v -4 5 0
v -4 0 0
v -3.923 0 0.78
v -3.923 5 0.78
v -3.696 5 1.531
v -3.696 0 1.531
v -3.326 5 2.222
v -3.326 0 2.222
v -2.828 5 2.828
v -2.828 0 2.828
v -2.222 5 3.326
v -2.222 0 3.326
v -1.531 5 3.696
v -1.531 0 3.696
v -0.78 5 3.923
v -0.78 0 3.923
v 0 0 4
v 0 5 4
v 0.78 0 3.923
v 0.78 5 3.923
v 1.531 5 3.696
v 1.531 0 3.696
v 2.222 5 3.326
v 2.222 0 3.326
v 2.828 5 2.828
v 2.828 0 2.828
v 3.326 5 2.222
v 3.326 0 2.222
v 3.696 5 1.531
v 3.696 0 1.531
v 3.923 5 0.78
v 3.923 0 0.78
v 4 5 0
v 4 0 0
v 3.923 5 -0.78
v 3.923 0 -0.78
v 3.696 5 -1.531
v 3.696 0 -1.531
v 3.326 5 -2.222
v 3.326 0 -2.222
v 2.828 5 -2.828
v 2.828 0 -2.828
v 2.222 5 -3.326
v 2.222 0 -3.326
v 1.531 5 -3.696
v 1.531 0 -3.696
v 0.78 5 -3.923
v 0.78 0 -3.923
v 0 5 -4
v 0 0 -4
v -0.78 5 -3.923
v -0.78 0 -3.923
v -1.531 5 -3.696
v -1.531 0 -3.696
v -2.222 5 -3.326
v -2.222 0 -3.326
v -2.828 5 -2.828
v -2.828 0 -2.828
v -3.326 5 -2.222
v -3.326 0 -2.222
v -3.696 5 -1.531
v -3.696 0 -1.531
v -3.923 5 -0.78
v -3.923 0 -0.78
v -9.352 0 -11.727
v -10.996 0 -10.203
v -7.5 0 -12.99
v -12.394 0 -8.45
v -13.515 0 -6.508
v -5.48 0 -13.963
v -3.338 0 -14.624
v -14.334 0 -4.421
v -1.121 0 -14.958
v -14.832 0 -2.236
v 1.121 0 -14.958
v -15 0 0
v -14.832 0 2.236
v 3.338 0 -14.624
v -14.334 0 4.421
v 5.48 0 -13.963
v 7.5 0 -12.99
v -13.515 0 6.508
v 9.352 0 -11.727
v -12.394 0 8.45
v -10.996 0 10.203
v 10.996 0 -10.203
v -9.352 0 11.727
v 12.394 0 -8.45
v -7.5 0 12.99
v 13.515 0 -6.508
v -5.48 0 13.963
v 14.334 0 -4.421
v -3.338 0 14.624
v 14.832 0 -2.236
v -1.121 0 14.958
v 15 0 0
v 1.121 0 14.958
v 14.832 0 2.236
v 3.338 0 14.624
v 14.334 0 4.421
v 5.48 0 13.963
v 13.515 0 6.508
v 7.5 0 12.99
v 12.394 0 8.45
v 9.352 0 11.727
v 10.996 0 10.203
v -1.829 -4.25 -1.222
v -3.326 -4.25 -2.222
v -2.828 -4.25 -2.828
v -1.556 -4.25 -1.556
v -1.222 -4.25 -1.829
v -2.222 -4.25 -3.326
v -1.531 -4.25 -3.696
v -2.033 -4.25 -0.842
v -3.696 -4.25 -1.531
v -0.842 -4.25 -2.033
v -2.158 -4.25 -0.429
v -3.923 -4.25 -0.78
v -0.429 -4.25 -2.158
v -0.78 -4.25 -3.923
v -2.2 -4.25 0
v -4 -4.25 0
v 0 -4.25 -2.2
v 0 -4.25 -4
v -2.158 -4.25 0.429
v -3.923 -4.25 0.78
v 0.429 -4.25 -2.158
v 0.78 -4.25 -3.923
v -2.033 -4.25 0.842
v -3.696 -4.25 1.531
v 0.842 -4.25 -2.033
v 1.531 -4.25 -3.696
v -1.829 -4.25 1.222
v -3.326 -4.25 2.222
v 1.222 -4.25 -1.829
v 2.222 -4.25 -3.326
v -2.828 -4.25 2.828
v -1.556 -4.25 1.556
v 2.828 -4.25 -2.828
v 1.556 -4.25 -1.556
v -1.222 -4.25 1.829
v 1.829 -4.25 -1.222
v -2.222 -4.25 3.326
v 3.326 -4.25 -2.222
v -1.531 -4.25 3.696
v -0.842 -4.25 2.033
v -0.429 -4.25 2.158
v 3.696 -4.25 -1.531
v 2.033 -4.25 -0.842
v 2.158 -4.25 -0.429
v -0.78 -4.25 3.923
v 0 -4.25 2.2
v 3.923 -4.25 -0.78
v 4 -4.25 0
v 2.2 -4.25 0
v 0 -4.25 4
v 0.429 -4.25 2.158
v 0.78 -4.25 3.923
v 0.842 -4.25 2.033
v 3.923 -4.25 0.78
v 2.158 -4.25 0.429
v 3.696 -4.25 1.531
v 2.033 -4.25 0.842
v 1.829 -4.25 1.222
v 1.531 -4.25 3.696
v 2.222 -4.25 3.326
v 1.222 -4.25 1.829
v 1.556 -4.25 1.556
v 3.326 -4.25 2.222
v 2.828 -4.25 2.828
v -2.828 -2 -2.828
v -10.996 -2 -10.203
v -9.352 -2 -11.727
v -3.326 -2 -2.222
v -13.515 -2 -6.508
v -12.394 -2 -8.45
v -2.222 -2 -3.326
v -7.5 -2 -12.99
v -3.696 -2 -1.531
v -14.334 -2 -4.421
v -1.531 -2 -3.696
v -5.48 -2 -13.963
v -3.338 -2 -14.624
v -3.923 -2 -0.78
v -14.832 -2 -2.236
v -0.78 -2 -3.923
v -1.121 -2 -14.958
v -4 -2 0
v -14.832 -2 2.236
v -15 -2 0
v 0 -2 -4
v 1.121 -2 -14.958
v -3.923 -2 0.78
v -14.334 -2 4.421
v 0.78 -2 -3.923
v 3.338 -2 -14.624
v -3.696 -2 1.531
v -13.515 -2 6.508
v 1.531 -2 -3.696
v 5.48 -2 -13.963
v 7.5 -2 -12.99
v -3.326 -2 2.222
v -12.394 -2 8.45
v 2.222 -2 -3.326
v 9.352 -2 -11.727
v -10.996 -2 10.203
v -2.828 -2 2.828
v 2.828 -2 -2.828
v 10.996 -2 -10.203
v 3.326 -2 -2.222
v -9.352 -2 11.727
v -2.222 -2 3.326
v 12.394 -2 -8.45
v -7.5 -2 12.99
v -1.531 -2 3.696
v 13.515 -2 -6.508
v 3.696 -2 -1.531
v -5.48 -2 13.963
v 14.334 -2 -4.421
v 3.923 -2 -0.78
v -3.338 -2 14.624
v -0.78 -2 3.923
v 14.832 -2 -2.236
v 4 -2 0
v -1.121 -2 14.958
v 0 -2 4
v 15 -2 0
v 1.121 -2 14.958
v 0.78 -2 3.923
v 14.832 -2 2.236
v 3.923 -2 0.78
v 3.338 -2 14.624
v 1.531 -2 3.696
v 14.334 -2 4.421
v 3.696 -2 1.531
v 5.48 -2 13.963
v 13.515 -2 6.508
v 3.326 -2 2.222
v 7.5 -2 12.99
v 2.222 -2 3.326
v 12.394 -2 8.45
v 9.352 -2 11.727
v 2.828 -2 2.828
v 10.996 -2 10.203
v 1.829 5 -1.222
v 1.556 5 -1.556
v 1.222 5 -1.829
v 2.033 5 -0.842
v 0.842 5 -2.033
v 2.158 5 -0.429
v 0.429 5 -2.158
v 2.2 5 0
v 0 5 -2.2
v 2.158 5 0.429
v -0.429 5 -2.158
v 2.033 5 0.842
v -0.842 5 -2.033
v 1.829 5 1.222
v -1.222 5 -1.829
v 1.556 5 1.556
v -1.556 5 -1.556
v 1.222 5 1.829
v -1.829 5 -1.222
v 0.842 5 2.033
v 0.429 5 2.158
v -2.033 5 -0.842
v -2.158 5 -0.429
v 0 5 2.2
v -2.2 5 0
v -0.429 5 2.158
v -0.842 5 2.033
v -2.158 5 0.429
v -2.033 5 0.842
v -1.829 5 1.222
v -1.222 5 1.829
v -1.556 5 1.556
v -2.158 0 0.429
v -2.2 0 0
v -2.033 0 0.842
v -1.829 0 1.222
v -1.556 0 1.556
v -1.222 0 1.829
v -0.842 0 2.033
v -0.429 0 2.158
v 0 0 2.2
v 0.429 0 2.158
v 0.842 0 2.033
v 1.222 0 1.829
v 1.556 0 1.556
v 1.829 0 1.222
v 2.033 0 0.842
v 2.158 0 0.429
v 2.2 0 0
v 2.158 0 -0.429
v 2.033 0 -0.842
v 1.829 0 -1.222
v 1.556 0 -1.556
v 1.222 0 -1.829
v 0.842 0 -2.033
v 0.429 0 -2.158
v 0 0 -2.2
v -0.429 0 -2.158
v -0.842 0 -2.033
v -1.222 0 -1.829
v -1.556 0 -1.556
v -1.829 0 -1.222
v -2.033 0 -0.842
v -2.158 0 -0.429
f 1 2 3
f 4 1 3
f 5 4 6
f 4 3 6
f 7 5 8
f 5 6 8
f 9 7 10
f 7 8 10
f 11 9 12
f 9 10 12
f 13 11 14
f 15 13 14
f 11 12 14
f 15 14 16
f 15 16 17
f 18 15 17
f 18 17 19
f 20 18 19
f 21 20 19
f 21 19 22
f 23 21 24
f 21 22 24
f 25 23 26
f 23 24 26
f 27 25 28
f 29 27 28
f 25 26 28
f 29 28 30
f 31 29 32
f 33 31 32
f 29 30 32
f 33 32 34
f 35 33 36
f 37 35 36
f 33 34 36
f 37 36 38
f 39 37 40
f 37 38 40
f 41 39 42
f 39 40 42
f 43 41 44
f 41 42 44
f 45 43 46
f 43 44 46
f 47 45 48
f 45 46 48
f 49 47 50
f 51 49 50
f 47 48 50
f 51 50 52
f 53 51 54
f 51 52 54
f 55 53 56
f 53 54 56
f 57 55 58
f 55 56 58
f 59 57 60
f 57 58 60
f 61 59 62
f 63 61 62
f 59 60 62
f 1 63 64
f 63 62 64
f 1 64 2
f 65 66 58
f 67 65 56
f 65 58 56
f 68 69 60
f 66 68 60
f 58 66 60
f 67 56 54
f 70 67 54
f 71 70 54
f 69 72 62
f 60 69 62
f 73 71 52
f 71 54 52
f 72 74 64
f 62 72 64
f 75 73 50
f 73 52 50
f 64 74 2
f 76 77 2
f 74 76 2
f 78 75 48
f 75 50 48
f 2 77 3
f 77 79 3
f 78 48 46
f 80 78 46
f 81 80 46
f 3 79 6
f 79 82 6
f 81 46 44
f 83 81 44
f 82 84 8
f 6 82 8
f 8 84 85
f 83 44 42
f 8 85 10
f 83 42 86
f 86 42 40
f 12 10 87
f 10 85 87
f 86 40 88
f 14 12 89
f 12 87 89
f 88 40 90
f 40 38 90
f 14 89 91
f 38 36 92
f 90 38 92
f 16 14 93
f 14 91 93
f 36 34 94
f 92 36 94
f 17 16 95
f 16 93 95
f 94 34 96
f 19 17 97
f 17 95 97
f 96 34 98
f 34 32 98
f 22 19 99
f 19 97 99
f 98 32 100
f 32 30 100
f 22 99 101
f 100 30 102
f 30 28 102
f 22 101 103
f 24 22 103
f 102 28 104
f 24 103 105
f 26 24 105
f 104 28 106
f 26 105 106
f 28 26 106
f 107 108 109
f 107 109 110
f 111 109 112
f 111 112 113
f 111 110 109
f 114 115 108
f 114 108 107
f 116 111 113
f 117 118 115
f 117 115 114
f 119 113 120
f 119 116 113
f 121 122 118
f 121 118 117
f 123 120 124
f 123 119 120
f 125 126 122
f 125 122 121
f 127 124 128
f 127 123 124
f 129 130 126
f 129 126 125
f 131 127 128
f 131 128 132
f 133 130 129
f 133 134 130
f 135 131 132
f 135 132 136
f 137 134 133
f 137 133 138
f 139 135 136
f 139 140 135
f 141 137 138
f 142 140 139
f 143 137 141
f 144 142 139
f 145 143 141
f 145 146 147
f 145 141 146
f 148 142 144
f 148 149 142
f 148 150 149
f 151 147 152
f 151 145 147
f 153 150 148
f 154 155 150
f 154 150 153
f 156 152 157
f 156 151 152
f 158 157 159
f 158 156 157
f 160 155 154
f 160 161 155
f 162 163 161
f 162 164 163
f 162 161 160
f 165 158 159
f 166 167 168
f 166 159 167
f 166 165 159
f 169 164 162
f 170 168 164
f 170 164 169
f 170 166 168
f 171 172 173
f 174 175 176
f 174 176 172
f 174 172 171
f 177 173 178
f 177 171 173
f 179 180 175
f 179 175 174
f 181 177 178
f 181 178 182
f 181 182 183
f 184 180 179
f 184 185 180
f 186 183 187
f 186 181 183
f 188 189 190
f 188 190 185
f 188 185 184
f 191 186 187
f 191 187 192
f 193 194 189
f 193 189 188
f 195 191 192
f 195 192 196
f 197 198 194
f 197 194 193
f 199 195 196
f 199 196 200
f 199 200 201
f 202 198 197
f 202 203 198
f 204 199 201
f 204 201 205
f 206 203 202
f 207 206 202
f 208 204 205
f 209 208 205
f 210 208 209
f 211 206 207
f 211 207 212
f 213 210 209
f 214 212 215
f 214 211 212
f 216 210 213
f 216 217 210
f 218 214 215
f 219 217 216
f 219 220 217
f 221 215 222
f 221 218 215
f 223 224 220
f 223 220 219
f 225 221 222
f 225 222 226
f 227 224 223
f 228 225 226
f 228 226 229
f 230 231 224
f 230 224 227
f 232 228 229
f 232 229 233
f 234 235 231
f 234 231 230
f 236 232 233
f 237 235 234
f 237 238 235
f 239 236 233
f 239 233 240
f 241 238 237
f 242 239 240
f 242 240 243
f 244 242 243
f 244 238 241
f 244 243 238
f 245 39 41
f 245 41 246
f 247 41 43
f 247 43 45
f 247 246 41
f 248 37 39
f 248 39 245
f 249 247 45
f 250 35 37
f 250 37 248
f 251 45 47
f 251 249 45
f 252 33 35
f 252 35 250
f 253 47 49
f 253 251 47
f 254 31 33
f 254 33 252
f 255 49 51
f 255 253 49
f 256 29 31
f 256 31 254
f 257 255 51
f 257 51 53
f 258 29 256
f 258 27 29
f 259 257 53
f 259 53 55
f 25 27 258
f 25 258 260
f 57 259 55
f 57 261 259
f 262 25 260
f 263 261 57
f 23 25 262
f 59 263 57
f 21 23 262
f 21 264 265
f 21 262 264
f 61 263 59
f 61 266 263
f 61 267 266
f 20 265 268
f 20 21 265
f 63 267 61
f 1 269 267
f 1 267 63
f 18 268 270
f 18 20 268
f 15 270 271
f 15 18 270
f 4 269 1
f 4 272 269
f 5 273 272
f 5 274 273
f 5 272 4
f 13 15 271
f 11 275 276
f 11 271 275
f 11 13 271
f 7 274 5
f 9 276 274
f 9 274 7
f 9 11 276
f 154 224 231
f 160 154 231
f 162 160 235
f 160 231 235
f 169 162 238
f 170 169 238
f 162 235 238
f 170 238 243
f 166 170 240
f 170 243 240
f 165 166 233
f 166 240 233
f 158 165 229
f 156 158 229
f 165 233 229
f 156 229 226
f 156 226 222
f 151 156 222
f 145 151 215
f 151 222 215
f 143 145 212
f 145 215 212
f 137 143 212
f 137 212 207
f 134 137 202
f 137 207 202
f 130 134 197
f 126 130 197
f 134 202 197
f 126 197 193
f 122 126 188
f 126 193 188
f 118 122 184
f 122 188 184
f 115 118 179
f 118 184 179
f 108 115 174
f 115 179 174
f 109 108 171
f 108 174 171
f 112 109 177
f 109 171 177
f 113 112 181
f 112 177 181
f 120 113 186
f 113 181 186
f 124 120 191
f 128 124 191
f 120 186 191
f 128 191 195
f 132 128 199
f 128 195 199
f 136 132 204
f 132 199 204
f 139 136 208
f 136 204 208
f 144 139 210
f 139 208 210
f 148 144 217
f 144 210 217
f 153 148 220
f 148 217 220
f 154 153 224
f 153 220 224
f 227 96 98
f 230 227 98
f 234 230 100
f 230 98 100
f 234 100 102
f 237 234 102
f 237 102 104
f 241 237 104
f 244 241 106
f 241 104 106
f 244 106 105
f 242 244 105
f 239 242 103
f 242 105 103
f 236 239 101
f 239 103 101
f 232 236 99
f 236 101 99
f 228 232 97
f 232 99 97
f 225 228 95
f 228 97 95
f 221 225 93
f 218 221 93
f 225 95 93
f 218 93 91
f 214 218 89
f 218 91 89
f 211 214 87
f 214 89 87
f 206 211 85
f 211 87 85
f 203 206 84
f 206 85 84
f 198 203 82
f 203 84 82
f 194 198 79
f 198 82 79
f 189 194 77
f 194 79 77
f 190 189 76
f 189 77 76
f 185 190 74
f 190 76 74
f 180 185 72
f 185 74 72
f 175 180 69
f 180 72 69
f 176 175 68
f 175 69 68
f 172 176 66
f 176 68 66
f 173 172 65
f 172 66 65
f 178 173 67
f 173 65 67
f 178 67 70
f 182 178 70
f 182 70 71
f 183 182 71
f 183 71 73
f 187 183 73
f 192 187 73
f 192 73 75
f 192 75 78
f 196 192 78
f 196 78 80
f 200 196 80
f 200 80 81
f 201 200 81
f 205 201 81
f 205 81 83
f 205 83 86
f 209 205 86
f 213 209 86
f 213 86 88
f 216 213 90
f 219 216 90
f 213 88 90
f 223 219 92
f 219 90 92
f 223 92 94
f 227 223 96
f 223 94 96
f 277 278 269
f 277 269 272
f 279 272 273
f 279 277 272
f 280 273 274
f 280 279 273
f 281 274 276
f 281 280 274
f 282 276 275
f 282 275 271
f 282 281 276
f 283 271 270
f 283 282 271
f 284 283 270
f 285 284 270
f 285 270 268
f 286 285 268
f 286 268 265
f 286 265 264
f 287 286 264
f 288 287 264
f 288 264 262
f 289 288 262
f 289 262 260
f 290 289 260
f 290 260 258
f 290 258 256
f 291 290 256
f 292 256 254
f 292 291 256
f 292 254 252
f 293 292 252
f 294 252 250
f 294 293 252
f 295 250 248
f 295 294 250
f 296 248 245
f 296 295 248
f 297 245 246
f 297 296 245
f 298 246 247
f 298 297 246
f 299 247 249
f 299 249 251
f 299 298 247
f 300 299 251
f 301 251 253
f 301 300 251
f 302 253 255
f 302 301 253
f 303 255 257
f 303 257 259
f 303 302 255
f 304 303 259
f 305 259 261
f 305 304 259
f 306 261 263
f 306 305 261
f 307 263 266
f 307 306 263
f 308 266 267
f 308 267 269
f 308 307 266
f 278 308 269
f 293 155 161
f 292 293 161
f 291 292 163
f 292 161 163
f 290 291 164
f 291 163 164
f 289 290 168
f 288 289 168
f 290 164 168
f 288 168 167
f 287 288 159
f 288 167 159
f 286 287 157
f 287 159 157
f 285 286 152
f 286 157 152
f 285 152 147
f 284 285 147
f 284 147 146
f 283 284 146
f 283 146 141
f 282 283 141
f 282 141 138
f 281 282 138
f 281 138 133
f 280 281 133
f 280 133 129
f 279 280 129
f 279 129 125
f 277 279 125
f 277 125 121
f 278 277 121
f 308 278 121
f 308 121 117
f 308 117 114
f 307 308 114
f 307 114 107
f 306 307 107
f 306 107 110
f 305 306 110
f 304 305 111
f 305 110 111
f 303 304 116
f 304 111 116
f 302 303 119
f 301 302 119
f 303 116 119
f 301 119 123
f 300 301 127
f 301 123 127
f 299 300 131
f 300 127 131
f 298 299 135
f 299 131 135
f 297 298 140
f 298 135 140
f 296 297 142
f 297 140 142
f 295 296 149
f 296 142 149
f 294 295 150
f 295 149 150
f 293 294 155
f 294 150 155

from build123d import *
from build123d import SkipClean  # not in build123d's __all__

# Parameters (mm, degrees)
F0_R     = 15
F1_DEPTH = 2
F2_R     = 4
F3_DEPTH = 2.25
F4_R     = 2.2
F5_DEPTH = 4.251
F6_R     = 4
F6_R_2   = 2.2
F7_DEPTH = 5


with BuildPart() as f1:
    # F0 (on Front) → F1 (new body)
    with BuildSketch(Plane.XZ):
        Circle(F0_R)
    extrude(amount=F1_DEPTH)

    # F2 (on face) → F3 (join)
    with BuildSketch(Plane.XZ.offset(2)):
        Circle(F2_R)
    extrude(amount=F3_DEPTH)

    # F4 (on face) → F5 (cut, through all)
    with BuildSketch(Plane.XZ.offset(4.25)):
        Circle(F4_R)
    extrude(amount=-F5_DEPTH, mode=Mode.SUBTRACT)

    # F6 (on face) → F7 (join)
    with BuildSketch(Plane(origin=(0, 0, 0), x_dir=(-1, 0, 0), z_dir=(0, 1, 0))):
        Circle(F6_R)
        Circle(F6_R_2, mode=Mode.SUBTRACT)
    with SkipClean():  # cleaning this boolean's faces spoils the solid; the shape is the same uncleaned
        extrude(amount=F7_DEPTH)


solid = f1.part
